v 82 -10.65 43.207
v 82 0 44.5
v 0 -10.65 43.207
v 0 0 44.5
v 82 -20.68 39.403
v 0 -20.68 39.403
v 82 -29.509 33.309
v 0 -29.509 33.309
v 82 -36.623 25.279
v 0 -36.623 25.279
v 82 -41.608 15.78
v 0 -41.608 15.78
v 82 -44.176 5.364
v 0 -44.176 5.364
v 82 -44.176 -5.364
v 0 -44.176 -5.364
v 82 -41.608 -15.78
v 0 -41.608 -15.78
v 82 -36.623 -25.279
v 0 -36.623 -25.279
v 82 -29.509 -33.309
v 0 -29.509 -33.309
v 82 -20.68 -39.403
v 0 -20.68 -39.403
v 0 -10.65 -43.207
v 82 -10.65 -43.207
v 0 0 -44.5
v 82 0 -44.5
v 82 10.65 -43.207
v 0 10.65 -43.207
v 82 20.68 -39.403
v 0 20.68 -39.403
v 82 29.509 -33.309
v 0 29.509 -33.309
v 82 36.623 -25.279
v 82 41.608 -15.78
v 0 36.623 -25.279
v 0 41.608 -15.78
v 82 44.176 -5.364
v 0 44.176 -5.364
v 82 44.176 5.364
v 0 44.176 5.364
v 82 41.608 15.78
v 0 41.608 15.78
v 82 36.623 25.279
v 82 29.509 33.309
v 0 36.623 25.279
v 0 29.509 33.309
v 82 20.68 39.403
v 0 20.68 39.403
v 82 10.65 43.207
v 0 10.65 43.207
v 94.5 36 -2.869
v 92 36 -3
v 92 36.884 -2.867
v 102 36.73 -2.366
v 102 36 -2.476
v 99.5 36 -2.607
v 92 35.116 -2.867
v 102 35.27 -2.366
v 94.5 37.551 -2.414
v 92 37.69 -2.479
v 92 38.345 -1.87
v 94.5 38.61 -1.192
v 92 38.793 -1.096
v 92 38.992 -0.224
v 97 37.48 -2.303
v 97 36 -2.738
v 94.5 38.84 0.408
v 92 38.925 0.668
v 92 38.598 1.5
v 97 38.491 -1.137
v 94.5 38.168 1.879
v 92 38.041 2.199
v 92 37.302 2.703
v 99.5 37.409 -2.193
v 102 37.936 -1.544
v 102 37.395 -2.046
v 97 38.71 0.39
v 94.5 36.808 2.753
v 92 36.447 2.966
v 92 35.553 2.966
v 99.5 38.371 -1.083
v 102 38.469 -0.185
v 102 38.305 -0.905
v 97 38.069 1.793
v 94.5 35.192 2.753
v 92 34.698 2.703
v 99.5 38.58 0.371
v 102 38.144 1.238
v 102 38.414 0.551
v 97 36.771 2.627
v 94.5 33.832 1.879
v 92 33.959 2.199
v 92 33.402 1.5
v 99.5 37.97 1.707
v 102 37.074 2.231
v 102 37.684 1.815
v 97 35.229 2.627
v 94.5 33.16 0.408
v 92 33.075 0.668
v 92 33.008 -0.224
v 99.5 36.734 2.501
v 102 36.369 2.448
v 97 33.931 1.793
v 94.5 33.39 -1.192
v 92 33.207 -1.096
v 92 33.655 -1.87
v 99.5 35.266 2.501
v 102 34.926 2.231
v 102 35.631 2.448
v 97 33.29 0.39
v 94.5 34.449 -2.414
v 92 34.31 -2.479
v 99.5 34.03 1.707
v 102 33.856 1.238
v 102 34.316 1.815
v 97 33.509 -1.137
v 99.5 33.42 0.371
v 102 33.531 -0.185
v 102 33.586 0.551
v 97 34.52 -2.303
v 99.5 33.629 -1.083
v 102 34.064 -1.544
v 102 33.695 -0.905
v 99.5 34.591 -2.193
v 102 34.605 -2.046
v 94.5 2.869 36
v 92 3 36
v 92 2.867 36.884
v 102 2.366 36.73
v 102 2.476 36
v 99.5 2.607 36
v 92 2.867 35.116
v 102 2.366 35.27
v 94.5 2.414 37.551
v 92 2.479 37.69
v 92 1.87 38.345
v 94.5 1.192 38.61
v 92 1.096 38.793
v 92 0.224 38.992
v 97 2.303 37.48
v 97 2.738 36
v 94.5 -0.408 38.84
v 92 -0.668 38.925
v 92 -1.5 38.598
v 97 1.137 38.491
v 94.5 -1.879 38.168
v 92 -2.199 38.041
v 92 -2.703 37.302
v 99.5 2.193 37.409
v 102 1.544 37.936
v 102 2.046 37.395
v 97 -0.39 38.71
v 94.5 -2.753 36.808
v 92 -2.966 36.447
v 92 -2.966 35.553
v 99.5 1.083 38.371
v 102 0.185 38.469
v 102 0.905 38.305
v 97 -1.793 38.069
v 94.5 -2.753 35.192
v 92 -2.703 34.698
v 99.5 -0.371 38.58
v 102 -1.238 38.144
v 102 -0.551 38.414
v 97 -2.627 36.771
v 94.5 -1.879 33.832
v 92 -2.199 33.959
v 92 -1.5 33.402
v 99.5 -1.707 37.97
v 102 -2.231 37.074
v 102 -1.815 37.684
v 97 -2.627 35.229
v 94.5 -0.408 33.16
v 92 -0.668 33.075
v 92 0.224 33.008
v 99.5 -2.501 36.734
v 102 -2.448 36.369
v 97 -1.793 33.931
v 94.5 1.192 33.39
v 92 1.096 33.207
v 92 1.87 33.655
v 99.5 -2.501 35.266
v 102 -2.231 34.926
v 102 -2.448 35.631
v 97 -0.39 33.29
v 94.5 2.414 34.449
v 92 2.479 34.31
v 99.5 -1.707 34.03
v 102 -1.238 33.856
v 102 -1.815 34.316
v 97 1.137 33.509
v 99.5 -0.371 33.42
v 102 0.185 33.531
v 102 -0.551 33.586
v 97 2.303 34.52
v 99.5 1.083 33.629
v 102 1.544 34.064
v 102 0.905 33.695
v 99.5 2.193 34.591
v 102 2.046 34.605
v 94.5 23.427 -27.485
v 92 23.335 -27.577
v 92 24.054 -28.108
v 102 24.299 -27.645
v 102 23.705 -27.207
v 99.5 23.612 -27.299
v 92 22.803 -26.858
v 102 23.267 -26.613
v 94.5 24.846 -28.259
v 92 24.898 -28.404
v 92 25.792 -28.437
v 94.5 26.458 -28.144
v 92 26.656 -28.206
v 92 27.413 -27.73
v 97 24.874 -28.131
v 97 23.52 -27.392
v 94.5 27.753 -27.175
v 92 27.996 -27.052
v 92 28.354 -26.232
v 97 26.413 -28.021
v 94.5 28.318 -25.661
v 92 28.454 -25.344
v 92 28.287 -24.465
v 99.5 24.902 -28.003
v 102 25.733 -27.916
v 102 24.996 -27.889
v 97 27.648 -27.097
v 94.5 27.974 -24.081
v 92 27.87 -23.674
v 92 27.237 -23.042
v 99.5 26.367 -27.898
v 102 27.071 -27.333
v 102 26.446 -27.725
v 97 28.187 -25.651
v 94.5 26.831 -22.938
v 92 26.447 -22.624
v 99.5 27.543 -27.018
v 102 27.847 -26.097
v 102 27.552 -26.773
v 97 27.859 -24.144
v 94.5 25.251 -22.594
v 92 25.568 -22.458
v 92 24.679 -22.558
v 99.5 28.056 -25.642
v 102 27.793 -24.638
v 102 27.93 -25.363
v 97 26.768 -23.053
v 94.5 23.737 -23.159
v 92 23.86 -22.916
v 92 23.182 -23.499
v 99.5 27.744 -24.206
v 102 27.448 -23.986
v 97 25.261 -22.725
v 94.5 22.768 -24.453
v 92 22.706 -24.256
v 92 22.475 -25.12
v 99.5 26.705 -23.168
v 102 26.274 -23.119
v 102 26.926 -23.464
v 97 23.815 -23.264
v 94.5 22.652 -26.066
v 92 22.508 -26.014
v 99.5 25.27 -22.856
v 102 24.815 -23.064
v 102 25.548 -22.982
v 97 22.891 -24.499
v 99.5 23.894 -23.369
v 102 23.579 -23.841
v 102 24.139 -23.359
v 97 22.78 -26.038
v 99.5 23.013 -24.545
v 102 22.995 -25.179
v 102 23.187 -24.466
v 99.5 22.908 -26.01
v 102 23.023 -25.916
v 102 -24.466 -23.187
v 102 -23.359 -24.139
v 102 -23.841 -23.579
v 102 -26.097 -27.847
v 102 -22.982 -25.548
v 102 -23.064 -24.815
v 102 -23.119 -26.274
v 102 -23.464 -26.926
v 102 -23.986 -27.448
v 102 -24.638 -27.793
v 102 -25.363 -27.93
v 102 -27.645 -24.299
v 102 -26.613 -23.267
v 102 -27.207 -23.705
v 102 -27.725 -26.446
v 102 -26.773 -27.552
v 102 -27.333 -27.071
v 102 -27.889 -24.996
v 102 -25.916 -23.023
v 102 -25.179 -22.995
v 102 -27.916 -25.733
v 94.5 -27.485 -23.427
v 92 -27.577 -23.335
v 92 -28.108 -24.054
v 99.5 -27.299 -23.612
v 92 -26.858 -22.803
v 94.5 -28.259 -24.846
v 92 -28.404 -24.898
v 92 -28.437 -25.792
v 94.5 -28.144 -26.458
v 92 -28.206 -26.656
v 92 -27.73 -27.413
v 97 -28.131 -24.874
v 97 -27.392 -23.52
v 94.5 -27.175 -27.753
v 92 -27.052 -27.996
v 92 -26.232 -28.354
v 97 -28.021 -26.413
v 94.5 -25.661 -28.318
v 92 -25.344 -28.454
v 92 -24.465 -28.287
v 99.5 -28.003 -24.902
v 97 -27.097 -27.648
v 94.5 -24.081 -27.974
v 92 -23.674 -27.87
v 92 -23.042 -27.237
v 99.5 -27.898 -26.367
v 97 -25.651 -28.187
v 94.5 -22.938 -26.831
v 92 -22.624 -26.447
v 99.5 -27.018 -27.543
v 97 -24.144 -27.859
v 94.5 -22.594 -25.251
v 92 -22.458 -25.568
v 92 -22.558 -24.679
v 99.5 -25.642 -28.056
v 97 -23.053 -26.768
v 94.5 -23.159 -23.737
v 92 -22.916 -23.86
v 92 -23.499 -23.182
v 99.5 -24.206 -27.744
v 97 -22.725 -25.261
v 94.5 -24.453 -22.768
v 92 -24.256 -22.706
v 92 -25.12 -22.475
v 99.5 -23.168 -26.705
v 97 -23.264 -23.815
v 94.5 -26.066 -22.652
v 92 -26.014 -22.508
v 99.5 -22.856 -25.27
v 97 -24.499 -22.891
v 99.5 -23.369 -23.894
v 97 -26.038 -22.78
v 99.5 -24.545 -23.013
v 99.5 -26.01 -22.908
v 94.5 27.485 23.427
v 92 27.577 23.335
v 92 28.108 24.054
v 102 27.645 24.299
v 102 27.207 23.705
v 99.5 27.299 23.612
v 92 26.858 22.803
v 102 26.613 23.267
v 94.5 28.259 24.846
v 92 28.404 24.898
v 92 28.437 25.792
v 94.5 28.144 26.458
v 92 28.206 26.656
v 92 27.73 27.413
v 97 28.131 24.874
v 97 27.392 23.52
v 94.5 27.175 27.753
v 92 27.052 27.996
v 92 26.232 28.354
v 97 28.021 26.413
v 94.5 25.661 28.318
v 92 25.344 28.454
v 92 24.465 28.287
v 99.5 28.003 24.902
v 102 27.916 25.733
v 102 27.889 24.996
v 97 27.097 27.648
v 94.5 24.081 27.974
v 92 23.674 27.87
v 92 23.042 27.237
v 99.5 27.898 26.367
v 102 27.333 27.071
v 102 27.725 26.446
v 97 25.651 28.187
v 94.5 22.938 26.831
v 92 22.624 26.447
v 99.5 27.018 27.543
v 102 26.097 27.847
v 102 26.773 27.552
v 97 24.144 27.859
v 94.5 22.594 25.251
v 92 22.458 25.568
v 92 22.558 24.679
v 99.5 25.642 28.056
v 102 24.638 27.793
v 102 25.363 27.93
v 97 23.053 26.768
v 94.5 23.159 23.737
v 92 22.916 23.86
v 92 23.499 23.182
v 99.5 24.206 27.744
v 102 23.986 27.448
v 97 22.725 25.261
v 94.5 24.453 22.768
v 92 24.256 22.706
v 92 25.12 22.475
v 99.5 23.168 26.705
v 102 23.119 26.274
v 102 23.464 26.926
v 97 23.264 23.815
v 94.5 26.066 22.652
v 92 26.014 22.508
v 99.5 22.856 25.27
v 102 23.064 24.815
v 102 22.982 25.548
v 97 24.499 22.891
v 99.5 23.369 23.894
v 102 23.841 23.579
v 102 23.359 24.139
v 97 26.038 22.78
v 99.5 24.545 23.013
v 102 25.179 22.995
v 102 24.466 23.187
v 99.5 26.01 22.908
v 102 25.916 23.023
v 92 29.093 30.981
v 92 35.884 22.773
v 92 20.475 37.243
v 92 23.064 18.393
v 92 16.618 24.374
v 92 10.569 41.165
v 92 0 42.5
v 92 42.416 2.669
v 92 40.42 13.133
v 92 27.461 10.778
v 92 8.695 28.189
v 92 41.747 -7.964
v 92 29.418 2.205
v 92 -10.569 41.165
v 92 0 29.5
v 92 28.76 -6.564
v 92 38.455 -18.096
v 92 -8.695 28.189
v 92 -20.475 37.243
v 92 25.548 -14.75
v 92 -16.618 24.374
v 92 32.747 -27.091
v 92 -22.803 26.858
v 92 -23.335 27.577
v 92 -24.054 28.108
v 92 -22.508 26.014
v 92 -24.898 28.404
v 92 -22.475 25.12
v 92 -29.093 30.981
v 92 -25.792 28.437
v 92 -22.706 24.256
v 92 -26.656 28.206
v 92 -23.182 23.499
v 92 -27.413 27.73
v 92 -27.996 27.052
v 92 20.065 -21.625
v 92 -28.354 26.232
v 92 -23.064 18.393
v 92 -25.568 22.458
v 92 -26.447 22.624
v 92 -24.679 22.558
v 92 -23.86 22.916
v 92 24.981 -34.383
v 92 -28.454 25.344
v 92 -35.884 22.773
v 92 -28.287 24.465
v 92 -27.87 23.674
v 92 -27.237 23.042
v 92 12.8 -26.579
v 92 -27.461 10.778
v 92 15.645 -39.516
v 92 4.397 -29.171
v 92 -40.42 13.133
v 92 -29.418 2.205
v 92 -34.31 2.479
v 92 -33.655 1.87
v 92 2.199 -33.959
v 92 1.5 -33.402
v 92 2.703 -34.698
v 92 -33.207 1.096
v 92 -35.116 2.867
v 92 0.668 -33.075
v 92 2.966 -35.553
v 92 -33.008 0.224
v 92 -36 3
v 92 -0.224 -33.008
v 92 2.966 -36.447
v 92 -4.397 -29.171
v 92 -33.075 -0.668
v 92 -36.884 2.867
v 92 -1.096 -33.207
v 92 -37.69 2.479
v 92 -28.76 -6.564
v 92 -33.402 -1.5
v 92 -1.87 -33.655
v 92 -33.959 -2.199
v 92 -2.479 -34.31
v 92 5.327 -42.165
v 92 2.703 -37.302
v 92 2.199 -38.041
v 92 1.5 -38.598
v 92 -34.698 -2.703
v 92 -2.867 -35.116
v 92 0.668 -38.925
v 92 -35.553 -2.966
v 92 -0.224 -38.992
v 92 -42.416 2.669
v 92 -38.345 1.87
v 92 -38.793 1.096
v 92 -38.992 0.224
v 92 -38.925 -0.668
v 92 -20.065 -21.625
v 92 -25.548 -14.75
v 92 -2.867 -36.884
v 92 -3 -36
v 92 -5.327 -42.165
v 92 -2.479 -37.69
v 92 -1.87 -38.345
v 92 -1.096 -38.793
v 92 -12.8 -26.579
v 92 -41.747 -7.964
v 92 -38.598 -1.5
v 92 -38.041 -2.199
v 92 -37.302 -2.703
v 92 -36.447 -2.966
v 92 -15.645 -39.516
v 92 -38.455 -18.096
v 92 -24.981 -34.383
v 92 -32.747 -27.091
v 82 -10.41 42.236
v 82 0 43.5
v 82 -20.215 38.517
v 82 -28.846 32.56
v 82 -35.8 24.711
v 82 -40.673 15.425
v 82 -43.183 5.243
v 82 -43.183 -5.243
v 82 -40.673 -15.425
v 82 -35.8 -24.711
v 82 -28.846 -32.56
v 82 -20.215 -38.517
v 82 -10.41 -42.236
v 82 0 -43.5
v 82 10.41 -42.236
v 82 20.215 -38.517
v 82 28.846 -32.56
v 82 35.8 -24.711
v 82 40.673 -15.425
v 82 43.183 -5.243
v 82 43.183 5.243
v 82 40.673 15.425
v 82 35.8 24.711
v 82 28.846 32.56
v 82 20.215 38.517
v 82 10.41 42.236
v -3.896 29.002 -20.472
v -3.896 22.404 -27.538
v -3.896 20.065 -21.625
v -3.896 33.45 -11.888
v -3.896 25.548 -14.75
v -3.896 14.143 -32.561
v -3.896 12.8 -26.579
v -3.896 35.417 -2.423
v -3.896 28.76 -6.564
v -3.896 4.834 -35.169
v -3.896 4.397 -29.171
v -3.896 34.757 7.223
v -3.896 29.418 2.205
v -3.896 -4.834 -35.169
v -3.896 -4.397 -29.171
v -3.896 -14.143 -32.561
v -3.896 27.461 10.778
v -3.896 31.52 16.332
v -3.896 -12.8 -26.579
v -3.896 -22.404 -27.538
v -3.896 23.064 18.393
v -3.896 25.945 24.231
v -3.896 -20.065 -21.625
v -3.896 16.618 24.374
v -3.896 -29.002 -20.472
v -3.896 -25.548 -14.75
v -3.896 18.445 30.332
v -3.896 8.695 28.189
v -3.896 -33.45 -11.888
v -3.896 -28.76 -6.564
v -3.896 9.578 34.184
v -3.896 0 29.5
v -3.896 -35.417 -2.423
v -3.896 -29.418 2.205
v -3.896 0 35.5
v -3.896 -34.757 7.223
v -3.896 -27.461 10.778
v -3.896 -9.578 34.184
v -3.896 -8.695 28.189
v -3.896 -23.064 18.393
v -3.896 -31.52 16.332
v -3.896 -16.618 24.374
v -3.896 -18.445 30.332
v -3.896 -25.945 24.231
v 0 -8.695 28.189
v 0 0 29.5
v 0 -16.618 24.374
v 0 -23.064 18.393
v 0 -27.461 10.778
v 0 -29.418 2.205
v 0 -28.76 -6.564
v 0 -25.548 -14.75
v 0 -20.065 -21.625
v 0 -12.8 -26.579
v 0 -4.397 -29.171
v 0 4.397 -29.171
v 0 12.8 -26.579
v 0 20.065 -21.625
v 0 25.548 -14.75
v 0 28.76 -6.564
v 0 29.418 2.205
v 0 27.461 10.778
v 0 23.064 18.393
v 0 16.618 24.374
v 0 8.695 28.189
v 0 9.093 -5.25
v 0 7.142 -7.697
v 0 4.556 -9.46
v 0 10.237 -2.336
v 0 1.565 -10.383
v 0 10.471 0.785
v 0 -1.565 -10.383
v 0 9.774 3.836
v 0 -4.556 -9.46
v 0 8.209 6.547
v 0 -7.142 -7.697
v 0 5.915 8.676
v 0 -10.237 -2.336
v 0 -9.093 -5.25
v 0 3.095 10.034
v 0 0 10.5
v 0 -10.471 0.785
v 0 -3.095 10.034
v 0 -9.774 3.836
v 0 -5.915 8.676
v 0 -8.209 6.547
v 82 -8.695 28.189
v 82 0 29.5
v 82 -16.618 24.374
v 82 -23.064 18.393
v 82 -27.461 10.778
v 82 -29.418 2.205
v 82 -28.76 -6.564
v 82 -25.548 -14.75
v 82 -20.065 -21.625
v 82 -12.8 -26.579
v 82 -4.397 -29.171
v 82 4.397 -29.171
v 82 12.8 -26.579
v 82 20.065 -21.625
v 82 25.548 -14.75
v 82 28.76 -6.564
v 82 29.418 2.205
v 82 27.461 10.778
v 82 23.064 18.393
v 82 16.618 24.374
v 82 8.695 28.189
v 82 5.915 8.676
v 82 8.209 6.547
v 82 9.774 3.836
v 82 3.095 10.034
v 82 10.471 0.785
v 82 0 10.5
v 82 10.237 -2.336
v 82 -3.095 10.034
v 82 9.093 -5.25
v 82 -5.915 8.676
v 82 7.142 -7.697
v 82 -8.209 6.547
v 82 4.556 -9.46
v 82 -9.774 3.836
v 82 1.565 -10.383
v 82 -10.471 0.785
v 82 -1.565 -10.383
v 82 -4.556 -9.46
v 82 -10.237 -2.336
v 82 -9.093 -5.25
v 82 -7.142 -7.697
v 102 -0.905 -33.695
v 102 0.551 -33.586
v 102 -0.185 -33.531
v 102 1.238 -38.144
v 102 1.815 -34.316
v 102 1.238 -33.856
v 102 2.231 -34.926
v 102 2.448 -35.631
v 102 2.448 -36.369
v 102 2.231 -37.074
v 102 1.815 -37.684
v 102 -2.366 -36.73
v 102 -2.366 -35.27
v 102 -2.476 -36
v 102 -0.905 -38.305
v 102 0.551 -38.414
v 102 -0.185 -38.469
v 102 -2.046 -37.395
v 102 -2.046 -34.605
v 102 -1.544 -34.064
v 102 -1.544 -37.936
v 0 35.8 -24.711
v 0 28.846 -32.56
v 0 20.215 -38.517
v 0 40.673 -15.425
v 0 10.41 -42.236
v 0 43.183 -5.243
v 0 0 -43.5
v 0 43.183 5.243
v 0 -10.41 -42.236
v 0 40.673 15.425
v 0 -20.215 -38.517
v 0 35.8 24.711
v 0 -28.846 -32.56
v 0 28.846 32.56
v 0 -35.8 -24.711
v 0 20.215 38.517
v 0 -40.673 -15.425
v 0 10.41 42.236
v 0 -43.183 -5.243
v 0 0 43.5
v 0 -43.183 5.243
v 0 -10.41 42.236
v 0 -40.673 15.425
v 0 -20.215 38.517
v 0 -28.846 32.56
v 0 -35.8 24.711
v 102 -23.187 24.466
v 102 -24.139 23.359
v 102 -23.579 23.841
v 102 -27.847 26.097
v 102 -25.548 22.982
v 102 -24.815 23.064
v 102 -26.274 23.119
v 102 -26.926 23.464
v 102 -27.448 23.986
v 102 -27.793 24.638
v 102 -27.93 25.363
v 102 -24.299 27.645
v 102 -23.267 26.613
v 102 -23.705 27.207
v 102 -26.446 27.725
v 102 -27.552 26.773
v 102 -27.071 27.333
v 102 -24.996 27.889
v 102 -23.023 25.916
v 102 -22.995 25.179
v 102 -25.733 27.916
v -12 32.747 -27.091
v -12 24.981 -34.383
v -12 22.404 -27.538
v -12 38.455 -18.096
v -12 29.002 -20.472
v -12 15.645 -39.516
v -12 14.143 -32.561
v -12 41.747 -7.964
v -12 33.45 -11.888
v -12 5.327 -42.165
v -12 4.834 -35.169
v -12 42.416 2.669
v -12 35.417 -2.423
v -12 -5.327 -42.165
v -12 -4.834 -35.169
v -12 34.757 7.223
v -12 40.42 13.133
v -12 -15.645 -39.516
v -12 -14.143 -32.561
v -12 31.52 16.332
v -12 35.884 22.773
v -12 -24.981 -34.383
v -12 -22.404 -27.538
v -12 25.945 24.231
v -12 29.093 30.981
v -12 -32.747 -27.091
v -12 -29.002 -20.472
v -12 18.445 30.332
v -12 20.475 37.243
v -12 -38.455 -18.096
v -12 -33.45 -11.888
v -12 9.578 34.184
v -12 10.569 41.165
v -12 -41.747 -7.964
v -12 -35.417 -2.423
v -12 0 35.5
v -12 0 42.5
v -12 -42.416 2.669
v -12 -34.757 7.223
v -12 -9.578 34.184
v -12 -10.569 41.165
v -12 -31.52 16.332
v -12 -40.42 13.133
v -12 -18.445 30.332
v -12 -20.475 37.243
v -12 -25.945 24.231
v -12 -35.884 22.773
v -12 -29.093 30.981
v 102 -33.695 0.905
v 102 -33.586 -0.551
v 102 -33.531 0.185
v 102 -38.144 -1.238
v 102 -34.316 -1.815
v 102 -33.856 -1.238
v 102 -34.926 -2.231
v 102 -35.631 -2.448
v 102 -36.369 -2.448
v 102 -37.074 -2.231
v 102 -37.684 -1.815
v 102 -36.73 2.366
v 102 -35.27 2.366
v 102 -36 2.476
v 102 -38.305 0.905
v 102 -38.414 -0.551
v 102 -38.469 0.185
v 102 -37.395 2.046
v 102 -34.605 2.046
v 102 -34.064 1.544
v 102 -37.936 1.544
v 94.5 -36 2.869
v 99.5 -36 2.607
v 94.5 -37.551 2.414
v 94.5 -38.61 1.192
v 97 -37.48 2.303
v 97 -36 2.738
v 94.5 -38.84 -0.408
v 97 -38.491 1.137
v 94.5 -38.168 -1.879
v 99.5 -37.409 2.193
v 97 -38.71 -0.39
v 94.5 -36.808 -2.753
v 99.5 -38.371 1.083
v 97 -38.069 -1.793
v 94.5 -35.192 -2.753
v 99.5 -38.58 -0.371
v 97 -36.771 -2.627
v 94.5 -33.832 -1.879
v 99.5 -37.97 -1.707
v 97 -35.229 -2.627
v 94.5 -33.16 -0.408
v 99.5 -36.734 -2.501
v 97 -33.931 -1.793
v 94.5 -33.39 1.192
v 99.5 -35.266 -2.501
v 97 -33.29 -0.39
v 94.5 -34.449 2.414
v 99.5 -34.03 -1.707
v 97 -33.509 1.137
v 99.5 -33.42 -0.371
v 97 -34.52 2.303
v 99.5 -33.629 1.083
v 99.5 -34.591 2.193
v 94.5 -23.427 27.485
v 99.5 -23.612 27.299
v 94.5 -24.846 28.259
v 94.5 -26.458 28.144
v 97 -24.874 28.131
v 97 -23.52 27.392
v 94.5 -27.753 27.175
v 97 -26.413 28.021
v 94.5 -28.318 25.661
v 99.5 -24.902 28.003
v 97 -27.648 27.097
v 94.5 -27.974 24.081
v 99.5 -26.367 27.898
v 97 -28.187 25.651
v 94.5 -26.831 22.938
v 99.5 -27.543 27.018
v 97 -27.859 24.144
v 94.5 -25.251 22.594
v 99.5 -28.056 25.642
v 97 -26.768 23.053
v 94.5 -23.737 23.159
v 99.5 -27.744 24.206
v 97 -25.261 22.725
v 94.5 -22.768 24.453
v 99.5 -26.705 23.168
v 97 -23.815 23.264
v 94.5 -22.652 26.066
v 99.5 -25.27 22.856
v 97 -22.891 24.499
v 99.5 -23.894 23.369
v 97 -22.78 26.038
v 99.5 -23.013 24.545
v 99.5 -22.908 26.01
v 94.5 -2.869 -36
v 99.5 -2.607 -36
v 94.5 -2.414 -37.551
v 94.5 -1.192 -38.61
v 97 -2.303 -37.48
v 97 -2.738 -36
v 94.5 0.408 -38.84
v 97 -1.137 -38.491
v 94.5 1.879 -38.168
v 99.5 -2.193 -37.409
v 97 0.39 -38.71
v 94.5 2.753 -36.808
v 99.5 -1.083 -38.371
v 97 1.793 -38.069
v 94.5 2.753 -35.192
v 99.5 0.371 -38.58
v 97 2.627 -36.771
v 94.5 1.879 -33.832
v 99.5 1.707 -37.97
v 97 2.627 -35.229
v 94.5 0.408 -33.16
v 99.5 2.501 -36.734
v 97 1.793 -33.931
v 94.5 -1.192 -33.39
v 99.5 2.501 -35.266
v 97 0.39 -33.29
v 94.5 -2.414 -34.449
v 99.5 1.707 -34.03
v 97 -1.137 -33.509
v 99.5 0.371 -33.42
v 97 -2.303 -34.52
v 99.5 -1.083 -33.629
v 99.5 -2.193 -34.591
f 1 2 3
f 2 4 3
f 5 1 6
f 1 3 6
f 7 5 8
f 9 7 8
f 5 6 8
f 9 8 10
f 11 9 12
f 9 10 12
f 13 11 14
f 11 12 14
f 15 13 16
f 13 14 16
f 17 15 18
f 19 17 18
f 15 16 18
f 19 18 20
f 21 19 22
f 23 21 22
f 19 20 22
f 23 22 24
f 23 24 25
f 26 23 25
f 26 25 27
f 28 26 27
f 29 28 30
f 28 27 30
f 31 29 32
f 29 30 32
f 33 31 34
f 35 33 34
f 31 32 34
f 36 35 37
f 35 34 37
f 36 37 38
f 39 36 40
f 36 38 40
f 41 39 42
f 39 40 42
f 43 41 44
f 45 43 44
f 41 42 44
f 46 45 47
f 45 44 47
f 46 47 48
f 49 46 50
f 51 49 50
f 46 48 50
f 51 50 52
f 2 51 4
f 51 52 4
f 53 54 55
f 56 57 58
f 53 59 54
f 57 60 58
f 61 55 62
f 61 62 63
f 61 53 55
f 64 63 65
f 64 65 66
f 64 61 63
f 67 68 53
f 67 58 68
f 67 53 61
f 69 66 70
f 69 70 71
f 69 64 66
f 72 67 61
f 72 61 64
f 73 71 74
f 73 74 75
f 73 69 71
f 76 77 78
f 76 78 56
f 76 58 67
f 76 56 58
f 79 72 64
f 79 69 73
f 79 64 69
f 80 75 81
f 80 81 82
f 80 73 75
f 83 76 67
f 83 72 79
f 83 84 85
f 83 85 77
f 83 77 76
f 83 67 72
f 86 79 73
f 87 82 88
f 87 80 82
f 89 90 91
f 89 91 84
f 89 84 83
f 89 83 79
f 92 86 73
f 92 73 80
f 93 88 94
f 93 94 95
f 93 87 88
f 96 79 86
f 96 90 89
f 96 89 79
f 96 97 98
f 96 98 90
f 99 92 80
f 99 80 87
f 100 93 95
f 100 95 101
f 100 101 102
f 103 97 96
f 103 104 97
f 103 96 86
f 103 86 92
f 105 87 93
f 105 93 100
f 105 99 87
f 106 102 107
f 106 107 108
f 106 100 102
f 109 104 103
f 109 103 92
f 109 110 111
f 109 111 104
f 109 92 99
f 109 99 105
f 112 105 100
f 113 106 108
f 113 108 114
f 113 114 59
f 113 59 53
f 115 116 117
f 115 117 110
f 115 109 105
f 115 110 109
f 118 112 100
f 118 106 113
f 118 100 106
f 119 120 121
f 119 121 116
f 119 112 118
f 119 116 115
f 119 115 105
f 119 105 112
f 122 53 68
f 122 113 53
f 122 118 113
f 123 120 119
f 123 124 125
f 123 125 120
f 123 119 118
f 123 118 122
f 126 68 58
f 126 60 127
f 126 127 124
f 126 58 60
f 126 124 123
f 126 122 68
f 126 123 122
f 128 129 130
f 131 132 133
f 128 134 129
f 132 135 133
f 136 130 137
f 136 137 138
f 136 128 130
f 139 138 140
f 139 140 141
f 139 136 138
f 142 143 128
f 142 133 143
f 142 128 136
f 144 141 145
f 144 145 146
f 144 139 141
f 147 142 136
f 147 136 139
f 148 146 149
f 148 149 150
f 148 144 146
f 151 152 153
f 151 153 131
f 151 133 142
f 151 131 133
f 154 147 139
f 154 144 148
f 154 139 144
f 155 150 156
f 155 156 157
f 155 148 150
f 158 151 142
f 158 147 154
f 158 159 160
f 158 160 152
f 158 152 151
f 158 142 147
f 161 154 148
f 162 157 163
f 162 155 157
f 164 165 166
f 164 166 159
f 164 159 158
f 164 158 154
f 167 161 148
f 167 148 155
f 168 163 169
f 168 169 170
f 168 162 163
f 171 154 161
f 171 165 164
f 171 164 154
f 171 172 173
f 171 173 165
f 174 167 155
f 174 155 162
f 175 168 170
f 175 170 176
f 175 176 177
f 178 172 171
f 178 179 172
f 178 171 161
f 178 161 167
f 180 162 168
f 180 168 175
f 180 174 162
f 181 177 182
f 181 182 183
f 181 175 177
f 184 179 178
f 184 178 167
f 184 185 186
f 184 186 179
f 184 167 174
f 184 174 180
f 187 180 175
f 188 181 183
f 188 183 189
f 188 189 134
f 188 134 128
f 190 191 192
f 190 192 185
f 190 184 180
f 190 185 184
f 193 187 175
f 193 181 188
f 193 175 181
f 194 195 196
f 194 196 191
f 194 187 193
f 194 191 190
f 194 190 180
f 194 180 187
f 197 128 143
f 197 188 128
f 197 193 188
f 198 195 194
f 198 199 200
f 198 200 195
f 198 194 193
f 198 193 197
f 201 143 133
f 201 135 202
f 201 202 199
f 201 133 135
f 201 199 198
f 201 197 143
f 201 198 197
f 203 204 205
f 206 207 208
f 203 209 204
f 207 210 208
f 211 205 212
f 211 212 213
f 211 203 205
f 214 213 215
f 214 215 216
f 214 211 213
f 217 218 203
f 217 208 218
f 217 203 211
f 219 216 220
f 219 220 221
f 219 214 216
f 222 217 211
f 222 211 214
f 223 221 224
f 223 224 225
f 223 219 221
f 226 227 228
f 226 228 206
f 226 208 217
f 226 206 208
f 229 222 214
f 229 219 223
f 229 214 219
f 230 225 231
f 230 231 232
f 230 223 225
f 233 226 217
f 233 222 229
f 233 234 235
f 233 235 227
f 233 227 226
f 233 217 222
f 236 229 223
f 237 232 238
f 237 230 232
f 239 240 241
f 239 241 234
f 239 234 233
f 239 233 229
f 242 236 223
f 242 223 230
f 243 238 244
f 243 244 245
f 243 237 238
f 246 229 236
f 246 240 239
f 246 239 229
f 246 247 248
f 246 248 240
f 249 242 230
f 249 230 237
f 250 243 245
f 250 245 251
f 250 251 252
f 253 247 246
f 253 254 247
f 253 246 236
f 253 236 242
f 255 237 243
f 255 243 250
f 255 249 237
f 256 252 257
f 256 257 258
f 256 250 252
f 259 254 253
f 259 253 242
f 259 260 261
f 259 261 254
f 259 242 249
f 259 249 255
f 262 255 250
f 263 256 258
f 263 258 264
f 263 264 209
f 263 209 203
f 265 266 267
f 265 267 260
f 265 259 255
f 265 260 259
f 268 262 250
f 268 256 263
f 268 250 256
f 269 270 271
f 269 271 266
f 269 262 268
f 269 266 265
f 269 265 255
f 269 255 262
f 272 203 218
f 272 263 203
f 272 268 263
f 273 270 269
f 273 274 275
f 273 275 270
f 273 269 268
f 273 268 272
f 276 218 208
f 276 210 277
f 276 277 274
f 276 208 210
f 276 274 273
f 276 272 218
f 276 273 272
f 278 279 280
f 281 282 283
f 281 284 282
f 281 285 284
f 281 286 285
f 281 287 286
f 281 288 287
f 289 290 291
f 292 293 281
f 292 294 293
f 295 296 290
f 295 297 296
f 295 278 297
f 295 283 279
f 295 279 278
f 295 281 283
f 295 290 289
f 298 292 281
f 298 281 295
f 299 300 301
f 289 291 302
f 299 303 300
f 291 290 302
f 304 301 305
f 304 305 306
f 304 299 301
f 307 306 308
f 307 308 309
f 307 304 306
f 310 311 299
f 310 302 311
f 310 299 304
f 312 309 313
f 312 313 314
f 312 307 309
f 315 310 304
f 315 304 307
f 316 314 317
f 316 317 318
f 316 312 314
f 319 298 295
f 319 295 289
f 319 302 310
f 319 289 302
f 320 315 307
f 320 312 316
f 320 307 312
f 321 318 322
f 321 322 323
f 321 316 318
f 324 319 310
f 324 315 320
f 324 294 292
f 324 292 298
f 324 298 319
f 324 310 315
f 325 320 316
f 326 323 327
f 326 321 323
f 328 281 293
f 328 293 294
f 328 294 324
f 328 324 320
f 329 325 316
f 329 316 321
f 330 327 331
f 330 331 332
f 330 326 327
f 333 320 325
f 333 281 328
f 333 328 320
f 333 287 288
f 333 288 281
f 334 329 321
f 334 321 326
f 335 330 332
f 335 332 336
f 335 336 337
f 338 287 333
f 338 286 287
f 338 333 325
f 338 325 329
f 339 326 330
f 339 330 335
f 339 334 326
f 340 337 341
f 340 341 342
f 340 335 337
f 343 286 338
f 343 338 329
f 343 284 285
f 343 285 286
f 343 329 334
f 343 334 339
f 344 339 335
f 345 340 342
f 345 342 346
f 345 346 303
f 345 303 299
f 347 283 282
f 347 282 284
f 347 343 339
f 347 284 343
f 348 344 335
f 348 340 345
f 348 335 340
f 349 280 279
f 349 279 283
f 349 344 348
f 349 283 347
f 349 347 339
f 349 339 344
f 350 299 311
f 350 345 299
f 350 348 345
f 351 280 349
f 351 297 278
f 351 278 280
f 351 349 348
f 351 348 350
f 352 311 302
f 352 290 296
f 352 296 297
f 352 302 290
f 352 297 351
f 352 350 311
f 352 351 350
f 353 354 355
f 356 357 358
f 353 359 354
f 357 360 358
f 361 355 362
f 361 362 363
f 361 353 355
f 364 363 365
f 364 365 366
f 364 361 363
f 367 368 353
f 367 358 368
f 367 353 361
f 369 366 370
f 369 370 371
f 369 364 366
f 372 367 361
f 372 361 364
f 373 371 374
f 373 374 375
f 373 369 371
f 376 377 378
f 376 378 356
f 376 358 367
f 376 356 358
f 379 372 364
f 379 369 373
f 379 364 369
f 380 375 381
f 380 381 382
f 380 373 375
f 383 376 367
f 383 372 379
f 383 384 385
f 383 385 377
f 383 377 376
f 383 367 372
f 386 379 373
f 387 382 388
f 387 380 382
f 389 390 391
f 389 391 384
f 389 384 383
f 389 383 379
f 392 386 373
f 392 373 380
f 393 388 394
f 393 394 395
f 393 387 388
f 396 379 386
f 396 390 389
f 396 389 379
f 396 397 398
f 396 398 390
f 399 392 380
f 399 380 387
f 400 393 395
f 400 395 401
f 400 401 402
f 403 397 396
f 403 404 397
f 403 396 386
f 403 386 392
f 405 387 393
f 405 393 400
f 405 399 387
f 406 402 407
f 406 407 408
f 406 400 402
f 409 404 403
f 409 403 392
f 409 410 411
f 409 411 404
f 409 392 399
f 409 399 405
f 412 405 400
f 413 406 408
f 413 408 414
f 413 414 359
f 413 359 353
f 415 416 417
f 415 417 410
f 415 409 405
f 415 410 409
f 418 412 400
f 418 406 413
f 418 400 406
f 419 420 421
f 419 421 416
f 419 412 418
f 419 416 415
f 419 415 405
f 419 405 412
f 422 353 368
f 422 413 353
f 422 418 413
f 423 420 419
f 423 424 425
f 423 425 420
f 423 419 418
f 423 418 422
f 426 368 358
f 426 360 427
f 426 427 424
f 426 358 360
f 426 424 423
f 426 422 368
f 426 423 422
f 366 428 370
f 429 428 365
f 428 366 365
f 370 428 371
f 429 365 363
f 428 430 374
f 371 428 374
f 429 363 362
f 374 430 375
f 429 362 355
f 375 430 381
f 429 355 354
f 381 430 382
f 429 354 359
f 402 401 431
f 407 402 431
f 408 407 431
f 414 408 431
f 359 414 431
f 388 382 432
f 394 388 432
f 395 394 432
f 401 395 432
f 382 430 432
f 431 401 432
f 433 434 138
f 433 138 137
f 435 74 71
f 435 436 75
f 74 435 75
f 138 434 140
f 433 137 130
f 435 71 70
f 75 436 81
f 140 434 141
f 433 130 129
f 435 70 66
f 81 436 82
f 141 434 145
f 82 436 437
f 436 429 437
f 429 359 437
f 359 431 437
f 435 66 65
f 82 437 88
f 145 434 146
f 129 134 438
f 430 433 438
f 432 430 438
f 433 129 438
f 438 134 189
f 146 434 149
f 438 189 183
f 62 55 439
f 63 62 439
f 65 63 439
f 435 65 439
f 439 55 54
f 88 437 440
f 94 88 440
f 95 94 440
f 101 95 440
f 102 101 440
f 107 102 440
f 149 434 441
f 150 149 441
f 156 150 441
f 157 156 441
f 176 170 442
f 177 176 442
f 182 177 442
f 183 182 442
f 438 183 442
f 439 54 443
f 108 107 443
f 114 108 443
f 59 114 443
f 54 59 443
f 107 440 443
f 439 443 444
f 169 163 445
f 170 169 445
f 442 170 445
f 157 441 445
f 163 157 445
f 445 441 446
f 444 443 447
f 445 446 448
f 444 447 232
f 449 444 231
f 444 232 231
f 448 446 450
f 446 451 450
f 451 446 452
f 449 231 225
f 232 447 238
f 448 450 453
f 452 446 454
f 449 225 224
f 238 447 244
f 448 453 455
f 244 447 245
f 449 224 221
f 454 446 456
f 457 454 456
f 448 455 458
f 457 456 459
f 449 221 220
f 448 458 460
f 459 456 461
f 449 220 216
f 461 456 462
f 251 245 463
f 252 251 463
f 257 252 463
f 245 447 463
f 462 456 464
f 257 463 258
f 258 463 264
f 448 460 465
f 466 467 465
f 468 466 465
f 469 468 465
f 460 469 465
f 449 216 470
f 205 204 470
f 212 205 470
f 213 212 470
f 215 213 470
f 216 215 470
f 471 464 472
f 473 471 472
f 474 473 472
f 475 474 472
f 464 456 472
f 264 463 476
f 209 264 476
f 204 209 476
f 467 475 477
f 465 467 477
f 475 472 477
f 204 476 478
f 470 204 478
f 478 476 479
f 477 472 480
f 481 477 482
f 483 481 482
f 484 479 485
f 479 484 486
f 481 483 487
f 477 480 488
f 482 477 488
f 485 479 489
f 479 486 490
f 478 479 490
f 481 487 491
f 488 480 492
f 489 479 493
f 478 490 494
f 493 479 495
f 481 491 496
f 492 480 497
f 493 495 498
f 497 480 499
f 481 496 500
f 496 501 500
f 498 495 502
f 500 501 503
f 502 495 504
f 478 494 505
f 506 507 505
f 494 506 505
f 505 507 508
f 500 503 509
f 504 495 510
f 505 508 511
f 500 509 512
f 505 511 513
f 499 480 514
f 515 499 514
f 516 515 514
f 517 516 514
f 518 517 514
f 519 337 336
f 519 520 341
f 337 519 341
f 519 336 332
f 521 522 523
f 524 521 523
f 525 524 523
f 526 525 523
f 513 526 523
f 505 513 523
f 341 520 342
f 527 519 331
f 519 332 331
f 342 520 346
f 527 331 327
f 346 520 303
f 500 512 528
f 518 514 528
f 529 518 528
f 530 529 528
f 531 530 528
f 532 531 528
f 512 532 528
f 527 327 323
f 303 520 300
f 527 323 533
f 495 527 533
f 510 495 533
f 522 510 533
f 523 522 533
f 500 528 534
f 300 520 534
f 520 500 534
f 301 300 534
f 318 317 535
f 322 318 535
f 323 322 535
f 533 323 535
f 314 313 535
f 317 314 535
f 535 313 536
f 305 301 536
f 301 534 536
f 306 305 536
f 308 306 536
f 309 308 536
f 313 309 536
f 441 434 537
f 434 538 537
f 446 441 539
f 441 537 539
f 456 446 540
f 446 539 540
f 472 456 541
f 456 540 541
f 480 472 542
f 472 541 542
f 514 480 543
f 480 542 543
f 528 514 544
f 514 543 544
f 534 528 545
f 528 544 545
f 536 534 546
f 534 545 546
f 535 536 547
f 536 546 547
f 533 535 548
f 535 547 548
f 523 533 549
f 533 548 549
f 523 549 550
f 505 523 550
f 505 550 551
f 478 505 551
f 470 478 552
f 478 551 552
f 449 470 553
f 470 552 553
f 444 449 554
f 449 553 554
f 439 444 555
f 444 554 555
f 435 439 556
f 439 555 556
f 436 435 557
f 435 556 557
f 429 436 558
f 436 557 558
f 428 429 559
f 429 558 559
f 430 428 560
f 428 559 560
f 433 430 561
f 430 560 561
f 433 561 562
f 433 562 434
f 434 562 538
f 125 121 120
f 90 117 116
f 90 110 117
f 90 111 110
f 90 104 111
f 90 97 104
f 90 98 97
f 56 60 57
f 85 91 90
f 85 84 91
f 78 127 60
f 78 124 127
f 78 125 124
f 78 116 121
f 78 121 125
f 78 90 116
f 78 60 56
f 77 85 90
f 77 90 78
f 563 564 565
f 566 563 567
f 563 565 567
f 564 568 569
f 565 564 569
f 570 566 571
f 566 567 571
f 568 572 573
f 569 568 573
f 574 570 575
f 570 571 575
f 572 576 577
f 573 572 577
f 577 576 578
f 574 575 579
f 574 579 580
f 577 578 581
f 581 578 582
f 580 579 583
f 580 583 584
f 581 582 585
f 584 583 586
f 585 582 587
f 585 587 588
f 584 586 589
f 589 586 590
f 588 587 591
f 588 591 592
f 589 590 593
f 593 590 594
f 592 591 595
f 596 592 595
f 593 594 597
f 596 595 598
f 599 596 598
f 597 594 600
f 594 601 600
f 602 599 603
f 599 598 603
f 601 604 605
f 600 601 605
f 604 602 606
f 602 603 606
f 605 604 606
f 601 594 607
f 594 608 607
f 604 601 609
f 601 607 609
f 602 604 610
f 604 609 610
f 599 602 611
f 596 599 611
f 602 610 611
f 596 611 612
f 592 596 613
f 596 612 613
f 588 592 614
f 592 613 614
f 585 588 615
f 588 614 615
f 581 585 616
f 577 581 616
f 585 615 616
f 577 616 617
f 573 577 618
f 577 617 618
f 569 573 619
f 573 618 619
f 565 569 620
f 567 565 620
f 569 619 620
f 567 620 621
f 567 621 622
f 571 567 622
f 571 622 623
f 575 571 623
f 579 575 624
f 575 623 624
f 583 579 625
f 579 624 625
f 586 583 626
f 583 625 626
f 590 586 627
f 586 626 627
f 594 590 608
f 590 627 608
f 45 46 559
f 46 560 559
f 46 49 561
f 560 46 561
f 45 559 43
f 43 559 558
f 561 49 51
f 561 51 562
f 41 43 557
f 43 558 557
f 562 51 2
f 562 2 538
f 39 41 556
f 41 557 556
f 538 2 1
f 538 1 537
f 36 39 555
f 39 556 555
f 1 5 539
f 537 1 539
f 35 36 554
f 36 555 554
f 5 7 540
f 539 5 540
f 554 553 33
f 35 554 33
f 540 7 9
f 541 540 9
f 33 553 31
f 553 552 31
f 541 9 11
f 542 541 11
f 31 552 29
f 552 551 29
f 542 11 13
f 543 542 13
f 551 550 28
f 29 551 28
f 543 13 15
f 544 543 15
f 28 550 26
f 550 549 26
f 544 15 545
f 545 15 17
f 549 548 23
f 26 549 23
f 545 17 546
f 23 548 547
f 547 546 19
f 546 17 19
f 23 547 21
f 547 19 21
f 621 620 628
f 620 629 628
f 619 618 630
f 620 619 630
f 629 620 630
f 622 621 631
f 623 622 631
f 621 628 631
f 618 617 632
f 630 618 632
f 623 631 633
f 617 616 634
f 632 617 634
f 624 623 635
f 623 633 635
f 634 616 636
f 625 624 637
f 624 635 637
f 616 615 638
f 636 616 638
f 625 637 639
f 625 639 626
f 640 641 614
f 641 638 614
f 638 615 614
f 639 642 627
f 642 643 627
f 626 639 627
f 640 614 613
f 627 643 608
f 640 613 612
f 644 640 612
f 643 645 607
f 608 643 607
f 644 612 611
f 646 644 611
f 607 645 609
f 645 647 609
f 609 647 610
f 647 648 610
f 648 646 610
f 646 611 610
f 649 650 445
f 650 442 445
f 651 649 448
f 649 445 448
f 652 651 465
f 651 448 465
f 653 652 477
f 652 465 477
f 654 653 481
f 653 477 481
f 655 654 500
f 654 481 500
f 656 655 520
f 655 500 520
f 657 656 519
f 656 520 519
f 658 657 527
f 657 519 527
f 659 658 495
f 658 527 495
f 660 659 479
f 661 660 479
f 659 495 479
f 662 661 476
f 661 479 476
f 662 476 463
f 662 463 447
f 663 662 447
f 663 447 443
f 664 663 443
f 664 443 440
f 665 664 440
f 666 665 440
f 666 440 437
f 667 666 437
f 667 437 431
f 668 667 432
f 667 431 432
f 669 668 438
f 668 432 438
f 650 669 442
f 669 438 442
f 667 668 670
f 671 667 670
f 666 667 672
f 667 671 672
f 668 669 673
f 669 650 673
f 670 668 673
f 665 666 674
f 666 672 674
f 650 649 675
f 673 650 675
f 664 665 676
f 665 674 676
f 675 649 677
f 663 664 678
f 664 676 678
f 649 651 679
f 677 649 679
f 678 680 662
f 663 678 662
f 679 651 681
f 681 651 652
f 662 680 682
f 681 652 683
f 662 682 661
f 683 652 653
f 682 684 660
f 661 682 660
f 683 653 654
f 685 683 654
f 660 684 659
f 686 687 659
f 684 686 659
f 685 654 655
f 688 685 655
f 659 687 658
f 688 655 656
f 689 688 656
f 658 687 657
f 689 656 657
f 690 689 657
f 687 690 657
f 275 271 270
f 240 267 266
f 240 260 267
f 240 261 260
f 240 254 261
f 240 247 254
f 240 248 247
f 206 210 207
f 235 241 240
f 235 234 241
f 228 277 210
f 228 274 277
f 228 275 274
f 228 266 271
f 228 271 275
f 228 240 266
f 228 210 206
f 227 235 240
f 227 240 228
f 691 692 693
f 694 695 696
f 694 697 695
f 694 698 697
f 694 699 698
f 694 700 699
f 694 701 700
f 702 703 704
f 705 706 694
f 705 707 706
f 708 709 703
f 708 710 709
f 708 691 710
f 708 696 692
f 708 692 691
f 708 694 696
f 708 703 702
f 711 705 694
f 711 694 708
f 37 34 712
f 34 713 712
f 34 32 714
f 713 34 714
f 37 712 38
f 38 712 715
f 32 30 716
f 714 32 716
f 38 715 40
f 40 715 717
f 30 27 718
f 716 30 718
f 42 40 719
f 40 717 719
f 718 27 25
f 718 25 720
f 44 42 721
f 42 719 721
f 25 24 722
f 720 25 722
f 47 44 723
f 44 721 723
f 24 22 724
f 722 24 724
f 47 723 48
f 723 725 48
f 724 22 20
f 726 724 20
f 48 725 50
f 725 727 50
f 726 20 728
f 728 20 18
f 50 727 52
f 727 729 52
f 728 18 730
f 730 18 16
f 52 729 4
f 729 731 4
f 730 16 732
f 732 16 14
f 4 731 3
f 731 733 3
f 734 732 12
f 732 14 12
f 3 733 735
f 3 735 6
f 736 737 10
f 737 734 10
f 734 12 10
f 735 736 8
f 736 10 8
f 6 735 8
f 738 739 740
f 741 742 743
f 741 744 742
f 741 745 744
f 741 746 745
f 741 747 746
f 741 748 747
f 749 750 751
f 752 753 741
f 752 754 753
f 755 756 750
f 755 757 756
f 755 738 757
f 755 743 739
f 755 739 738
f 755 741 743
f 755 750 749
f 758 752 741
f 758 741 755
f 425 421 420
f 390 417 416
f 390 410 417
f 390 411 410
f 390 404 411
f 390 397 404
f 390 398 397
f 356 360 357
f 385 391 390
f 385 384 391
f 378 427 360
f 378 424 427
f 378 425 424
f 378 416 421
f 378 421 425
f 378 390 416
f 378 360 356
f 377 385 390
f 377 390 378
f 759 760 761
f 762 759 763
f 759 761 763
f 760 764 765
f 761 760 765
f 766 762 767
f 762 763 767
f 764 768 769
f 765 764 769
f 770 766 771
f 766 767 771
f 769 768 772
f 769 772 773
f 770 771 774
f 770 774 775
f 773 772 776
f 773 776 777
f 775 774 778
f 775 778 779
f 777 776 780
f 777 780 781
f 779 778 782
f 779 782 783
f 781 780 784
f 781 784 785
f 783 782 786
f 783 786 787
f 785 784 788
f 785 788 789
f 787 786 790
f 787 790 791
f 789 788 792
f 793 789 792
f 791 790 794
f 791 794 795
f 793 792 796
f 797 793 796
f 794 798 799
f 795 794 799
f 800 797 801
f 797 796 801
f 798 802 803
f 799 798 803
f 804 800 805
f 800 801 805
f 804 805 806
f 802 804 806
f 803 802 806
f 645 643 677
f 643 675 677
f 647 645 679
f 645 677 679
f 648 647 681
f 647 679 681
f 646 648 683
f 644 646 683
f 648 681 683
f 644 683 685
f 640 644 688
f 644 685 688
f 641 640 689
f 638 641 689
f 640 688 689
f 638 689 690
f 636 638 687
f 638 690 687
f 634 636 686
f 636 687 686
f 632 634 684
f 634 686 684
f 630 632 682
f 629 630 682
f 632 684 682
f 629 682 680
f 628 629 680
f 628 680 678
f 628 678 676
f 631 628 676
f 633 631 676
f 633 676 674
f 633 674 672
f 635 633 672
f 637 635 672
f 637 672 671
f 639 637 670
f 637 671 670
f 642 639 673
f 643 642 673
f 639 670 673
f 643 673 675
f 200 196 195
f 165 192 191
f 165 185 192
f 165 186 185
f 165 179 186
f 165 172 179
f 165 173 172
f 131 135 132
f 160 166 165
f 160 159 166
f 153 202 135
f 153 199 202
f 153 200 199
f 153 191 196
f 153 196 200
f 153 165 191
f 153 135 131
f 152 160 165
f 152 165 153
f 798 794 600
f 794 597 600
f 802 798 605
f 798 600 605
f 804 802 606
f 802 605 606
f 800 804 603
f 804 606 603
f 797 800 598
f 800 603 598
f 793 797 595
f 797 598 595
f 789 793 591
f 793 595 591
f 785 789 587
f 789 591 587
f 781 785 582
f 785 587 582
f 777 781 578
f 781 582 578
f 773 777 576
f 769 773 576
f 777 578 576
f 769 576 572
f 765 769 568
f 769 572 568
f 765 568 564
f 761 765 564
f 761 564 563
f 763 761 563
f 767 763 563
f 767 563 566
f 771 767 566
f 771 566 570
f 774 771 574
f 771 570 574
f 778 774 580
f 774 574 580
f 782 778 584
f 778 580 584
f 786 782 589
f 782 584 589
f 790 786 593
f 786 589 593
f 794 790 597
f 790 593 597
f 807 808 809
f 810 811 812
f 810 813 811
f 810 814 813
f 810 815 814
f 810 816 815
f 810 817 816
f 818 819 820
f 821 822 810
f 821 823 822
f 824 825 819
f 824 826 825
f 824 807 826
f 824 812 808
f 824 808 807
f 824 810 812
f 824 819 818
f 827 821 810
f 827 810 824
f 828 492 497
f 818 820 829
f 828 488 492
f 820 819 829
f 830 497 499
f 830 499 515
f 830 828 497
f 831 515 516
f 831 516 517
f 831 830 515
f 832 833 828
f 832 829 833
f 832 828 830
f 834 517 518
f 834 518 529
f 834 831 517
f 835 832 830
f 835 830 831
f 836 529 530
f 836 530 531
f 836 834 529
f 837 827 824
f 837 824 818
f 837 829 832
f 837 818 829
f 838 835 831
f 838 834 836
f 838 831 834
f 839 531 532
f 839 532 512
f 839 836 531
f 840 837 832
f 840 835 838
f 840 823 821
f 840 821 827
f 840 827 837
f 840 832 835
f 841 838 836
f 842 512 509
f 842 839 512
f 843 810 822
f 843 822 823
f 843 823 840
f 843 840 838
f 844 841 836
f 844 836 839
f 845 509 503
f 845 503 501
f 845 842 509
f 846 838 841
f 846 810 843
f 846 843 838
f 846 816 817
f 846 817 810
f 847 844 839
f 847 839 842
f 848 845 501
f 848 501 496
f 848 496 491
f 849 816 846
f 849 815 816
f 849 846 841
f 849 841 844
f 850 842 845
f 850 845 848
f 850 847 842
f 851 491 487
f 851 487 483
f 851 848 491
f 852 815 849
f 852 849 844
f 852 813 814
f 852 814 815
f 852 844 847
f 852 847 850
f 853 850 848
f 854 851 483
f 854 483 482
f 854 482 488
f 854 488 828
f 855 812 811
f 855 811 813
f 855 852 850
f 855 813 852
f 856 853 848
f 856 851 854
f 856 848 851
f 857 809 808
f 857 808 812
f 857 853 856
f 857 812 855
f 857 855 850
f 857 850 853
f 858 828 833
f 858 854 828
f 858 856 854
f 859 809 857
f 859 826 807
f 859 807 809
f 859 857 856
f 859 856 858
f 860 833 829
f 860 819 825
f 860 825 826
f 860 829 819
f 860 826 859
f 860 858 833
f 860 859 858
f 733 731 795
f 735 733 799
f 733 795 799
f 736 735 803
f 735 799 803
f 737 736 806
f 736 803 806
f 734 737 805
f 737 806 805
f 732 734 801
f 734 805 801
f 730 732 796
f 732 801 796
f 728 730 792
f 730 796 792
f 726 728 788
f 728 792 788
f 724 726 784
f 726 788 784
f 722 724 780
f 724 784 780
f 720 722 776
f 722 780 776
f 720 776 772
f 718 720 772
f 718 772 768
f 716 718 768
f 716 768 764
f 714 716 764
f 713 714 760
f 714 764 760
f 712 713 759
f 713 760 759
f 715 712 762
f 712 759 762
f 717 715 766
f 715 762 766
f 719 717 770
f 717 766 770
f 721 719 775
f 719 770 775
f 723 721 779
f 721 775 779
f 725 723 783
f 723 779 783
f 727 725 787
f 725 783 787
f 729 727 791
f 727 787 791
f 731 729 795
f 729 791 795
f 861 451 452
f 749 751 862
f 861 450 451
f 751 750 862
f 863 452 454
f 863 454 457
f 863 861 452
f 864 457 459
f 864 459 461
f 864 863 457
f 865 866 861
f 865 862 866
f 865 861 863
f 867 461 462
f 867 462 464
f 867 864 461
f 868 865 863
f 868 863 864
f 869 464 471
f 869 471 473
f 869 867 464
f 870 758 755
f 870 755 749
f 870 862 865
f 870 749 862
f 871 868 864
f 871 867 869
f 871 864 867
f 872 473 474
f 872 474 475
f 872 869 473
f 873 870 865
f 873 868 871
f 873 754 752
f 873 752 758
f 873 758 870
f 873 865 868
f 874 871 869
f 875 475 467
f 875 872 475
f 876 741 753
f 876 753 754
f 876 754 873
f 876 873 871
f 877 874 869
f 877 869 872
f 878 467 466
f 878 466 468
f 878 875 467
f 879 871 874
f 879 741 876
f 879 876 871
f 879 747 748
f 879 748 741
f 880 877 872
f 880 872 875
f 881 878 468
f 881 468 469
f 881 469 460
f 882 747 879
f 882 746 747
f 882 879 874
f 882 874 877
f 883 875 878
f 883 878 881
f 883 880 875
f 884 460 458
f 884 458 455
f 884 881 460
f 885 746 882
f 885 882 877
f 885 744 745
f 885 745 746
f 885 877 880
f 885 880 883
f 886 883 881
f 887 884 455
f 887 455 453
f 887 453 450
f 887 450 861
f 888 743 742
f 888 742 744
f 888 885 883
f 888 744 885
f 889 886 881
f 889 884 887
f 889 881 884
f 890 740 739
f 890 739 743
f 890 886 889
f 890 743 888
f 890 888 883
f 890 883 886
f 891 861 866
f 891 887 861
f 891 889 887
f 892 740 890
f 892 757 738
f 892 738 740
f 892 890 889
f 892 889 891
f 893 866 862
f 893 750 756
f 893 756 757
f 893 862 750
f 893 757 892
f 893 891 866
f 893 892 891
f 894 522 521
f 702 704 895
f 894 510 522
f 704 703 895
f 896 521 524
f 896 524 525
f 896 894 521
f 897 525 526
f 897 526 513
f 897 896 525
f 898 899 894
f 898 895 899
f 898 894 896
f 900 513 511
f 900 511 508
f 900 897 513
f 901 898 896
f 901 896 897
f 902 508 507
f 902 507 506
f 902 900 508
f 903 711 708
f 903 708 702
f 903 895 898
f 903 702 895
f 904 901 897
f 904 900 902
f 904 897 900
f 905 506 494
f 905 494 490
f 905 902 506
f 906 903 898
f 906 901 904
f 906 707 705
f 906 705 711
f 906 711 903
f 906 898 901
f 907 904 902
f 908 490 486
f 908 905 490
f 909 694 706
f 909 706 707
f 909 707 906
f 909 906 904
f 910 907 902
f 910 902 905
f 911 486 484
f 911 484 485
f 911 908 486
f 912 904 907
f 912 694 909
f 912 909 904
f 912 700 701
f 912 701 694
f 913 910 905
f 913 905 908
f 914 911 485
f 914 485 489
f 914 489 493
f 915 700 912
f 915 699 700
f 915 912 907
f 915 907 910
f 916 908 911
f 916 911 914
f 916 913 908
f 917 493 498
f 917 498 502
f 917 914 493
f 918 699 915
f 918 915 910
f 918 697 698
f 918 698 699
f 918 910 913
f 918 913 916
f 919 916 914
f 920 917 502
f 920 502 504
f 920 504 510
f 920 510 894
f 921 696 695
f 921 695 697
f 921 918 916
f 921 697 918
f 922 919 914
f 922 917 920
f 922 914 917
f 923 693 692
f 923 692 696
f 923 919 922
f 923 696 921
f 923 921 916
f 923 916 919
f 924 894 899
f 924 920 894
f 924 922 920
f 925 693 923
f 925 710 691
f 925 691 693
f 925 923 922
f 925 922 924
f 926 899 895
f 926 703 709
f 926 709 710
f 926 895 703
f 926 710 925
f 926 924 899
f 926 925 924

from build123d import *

# Parameters (mm, degrees)
ESBO_O2_R         = 3
EXTRUS_O1_DEPTH   = 10
EXTRUS_O1_TAPER   = 3
CIRPATTERN1_COUNT = 8


with BuildPart() as part:
    # Esboço1 → Revolução1 (revolve)
    with BuildSketch(Plane.XY):
        Polygon((0, 10.5), (82, 10.5), (82, 29.5), (92, 29.5), (92, 42.5), (82, 43.5), (82, 44.5), (0, 44.5), (0, 43.5), (-12, 42.5), (-12, 35.5), (-3.89618766, 35.5), (-3.89618766, 29.5), (0, 29.5), align=None)
    revolve(axis=Axis((0, 0, 0), (1, 0, 0)))

    # Esboço2 → Extrusão1 (add)
    with BuildSketch(Plane(origin=(92, 0, 0), x_dir=(0, 0, -1), z_dir=(1, 0, 0))):
        with Locations((0, 36)):
            Circle(ESBO_O2_R)
    extrus_o1 = extrude(amount=EXTRUS_O1_DEPTH, taper=EXTRUS_O1_TAPER)

    # CirPattern1: Extrusão1 ×8 about axis
    cirpattern1_axis = Axis((0, 0, 0), (1, 0, 0))
    for i in range(1, CIRPATTERN1_COUNT):
        add(extrus_o1.rotate(cirpattern1_axis, i * 360 / CIRPATTERN1_COUNT))


solid = part.part
